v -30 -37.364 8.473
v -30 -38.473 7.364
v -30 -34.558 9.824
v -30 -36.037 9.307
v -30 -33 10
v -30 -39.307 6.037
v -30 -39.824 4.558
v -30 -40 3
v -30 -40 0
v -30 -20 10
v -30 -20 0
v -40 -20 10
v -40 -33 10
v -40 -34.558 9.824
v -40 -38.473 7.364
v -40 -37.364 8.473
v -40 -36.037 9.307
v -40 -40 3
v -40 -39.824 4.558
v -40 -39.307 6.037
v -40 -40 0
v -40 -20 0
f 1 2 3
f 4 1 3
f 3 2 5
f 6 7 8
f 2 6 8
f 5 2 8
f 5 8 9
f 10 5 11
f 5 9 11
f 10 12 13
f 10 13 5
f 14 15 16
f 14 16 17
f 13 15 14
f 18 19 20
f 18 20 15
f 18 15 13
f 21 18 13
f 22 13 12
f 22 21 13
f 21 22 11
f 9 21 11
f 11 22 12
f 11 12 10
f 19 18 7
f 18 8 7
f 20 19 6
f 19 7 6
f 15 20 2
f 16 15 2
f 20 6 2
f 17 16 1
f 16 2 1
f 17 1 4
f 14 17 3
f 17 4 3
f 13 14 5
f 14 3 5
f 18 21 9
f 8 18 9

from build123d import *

# Parameters (mm, degrees)
SKETCH_1_W      = 10
SKETCH_1_H      = 20
EXTRUDE_1_DEPTH = 10
FILLET_1_R      = 7


with BuildPart() as part:
    # 草图1 → 凸台-拉伸1 (new body)
    with BuildSketch(Plane.XY):
        with Locations((-35, -30)):
            Rectangle(SKETCH_1_W, SKETCH_1_H)
    extrude(amount=EXTRUDE_1_DEPTH)

    # 圆角1
    fillet_1_edges = [part.edges().sort_by_distance(p)[0] for p in [
        (-35, -40, 10),
    ]]
    fillet(fillet_1_edges, radius=FILLET_1_R)


solid = part.part
